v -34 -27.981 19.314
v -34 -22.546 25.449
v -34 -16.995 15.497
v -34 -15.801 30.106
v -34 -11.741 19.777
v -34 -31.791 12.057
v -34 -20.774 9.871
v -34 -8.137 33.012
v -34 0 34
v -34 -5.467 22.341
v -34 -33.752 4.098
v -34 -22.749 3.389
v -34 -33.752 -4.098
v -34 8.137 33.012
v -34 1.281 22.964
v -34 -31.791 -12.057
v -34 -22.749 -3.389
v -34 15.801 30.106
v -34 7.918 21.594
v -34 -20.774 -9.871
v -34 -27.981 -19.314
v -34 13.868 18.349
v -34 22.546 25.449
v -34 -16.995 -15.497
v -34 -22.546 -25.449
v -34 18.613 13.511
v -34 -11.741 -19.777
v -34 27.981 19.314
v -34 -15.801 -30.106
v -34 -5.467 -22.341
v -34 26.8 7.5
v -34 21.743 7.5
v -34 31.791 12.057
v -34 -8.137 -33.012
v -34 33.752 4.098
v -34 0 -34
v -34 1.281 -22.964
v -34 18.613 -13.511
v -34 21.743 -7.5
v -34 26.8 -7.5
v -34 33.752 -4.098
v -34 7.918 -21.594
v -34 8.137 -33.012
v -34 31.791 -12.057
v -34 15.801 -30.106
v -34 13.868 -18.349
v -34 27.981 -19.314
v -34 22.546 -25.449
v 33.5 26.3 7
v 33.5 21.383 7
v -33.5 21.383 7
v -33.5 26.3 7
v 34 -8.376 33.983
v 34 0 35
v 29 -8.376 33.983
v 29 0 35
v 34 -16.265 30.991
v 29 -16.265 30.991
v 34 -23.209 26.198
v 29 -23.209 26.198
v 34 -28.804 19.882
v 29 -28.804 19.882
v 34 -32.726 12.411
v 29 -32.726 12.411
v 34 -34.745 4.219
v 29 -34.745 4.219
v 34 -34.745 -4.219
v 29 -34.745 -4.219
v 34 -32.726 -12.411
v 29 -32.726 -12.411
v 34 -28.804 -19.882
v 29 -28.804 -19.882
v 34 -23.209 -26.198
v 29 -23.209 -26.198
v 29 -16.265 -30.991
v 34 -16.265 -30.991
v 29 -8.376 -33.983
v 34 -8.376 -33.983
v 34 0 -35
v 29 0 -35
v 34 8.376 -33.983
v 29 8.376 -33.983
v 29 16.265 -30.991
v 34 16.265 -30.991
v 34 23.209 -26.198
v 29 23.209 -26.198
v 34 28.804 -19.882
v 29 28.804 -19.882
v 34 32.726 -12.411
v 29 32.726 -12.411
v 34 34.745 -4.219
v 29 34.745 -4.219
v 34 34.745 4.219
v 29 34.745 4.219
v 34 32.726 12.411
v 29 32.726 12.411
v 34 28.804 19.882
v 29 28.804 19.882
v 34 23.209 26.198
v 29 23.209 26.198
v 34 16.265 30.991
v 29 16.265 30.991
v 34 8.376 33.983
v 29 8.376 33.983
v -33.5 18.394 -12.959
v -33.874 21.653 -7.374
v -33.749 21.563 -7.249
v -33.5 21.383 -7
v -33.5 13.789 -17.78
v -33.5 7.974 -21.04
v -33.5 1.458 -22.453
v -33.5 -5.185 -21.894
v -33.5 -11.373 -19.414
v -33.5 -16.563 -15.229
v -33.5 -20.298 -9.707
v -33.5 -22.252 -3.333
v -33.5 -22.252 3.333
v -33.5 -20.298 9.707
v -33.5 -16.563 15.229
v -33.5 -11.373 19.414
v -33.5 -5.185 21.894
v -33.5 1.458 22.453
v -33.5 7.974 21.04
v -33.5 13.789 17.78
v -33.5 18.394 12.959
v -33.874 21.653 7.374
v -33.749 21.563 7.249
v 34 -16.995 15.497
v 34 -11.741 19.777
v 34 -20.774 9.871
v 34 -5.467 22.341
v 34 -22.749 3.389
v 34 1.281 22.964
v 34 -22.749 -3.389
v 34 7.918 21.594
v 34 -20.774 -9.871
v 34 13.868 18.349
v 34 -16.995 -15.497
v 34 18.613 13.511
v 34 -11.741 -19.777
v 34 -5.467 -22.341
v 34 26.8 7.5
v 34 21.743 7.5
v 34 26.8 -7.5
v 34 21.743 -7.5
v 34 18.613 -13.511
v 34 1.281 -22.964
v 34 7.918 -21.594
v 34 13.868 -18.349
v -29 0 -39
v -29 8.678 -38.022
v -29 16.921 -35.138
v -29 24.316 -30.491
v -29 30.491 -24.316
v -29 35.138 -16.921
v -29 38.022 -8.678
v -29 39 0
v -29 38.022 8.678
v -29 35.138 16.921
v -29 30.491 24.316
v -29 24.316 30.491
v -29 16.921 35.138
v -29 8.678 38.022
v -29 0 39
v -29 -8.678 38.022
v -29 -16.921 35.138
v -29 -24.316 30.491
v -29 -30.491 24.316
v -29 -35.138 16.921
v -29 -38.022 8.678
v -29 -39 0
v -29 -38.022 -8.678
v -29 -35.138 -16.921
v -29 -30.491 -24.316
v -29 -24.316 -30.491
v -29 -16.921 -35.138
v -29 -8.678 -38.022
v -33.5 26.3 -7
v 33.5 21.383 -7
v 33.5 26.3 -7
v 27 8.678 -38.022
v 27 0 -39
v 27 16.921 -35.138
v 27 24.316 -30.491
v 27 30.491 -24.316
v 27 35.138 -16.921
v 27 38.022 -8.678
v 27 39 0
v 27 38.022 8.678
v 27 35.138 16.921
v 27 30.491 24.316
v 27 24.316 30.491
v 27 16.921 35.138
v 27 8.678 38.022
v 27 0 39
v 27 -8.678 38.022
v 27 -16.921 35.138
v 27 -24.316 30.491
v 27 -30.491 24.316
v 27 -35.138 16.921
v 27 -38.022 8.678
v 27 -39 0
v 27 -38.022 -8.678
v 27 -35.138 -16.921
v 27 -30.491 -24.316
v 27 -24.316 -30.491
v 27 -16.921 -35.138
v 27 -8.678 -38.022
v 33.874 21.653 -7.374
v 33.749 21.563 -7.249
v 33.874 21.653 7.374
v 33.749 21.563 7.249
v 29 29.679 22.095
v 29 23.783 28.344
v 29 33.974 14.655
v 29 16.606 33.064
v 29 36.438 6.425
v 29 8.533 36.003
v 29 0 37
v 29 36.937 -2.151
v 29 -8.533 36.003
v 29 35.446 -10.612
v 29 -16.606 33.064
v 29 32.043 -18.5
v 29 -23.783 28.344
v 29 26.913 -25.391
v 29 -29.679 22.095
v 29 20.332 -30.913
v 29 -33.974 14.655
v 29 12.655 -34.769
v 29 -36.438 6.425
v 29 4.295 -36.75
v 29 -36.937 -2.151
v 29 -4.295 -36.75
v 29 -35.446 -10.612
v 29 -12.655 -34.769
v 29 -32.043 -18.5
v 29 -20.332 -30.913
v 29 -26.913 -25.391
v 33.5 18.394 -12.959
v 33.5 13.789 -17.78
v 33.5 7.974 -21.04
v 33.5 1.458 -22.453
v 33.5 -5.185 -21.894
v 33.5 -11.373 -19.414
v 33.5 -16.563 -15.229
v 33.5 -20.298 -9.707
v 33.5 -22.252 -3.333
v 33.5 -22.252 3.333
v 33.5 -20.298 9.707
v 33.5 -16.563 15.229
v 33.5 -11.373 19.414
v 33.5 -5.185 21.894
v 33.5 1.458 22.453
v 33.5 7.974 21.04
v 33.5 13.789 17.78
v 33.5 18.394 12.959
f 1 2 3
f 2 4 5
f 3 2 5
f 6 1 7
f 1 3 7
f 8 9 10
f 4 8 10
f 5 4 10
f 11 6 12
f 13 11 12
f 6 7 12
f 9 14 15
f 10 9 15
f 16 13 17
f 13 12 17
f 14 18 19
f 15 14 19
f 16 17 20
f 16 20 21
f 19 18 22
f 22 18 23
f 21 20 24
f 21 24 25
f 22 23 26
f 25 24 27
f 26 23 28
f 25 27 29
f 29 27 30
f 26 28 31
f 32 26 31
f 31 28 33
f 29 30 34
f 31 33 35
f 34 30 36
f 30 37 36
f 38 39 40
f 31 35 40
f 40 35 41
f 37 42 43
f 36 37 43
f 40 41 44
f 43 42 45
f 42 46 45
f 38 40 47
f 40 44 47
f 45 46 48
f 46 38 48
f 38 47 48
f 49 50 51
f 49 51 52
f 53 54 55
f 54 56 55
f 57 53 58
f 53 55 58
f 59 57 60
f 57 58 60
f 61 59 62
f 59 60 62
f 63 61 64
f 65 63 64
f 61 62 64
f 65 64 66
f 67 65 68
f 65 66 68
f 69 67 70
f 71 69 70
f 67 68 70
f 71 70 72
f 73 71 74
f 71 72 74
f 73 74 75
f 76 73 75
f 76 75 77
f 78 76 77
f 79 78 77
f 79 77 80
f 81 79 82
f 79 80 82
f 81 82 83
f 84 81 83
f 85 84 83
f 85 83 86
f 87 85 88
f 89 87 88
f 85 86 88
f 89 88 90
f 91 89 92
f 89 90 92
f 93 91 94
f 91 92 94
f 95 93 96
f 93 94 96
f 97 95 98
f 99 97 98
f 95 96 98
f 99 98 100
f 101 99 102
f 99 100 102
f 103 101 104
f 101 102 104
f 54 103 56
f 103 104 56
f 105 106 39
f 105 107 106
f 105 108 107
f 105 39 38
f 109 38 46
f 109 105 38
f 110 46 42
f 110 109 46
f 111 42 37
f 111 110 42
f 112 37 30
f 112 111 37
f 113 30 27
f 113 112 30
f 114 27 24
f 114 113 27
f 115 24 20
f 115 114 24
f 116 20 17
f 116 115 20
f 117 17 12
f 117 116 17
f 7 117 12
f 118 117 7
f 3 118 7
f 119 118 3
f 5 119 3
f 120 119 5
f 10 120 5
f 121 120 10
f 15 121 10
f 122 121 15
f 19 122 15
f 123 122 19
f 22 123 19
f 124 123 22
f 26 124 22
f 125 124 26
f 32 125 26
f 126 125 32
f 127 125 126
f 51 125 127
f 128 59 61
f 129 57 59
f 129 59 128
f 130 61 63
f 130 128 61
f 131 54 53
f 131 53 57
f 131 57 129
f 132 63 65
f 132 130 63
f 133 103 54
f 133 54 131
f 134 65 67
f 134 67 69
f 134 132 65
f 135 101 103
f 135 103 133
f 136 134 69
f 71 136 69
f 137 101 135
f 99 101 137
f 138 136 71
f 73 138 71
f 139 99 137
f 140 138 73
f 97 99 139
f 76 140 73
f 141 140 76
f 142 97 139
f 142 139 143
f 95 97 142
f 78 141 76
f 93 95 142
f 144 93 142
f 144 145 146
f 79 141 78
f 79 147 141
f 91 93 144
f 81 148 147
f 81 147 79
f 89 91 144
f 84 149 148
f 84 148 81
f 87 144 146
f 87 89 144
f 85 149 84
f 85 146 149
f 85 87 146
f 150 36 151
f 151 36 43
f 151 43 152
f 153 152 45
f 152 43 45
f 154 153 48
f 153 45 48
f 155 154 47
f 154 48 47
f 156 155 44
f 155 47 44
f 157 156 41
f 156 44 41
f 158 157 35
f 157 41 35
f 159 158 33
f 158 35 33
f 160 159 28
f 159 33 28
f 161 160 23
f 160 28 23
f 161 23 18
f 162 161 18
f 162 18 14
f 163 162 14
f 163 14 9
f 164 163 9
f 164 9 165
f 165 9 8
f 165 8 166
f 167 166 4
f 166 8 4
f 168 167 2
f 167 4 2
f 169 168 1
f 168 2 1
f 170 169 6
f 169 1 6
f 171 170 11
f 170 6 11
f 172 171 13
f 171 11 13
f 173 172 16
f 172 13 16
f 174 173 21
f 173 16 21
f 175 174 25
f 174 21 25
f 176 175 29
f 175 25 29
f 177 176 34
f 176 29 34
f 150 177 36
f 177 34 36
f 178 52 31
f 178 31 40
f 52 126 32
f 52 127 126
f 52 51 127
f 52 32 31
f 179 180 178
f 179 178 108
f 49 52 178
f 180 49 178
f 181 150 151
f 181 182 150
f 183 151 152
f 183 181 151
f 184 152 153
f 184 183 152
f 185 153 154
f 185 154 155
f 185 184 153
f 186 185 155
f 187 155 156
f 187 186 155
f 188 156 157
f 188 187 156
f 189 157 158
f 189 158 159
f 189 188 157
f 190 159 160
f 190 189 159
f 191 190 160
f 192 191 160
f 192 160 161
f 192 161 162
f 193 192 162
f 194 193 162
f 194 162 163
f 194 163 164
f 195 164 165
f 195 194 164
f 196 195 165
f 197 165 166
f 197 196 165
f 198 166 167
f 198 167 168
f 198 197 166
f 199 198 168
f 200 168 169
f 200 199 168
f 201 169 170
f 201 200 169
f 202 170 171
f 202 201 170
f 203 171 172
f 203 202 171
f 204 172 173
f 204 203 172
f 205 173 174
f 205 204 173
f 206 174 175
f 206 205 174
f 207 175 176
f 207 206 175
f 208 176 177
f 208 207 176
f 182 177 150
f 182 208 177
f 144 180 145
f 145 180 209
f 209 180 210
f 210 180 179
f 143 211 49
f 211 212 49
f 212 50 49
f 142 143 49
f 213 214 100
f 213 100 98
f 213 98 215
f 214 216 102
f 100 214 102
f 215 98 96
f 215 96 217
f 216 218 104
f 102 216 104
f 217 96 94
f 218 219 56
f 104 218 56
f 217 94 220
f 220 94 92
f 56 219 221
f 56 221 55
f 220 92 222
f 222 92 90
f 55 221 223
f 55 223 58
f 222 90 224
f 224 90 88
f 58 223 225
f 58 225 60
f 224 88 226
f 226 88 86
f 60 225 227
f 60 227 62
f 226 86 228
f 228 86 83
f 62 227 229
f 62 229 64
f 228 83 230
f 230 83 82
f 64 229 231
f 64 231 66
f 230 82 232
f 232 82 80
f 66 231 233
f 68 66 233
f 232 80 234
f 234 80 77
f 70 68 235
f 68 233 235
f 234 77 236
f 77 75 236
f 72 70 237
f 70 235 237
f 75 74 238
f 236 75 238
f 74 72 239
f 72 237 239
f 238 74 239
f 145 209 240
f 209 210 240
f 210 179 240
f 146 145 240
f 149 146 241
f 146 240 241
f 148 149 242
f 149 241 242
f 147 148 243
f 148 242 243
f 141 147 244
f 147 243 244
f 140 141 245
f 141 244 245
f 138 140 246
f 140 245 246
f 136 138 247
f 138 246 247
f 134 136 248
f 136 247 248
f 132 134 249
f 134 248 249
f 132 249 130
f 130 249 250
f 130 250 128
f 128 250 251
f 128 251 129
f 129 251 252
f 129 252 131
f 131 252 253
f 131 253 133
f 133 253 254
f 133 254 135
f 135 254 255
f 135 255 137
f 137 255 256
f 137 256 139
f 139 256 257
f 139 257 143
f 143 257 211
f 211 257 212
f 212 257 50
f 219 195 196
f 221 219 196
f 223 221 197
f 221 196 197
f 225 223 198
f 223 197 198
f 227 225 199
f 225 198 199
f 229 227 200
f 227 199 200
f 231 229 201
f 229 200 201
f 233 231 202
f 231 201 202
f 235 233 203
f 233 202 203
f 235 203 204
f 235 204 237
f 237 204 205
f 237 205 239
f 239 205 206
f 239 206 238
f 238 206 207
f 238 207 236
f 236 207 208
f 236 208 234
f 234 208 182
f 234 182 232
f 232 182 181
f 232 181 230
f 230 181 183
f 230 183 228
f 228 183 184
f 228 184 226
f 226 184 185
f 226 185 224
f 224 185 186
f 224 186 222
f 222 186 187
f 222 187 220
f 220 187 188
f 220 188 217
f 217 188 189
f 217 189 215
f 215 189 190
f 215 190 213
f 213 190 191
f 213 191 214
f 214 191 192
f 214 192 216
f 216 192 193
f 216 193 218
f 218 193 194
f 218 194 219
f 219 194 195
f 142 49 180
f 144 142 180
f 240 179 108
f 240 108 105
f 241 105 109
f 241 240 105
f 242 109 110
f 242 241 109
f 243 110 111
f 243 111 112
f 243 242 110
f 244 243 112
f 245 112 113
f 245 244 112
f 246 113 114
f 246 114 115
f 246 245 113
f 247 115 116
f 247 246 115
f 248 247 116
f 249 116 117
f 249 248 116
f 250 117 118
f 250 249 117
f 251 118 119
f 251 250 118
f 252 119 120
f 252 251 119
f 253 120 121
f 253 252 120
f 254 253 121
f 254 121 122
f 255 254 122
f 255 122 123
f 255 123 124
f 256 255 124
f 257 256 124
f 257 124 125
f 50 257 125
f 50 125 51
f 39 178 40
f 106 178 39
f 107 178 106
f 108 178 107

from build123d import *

# Parameters (mm, degrees)
SKETCH_1_R      = 39
EXTRUDE_1_DEPTH = 34
CHAMFER_1_SIZE  = 5
CHAMFER_2_SIZE  = 0.5


with BuildPart() as part:
    # Эскиз1 → Бобышка-Вытянуть1 (new, symmetric)
    with BuildSketch(Plane(origin=(0, 0, 0), x_dir=(0, 0, -1), z_dir=(1, 0, 0))):
        Circle(SKETCH_1_R)
        with BuildLine():
            Line((-7, 26.3), (7, 26.3))
            Line((7, 26.3), (7, 21.38340478))
            ThreePointArc((7, 21.38340478), (0, -22.5), (-7, 21.38340478))
            Line((-7, 21.38340478), (-7, 26.3))
        make_face(mode=Mode.SUBTRACT)
    extrude(amount=EXTRUDE_1_DEPTH, both=True)

    # Фаска1
    chamfer_1_edges = [part.edges().sort_by_distance(p)[0] for p in [
        (-34, 0, 39),
    ]]
    chamfer(chamfer_1_edges, length=CHAMFER_1_SIZE)

    # Фаска2
    chamfer_2_edges = [part.edges().sort_by_distance(p)[0] for p in [
        (34, 26.3, 0),
        (34, 23.84170239, 7),
        (-34, -22.5, 0),
        (-34, 23.84170239, -7),
        (-34, 26.3, 0),
        (-34, 23.84170239, 7),
        (34, -22.5, 0),
        (34, 23.84170239, -7),
    ]]
    chamfer(chamfer_2_edges, length=CHAMFER_2_SIZE)

    # Эскиз2 → Вырез-Повернуть1 (revolve, cut)
    with BuildSketch(Plane.XY, mode=Mode.PRIVATE) as cut_revolve_1_sk:
        Polygon((34, 35), (29, 35), (29, 37), (27, 39), (34, 39), align=None)
    revolve(cut_revolve_1_sk.sketch.rotate(Axis((0, 0, 0), (1, 0, 0)), 90), axis=Axis((0, 0, 0), (1, 0, 0)), mode=Mode.SUBTRACT)


solid = part.part
